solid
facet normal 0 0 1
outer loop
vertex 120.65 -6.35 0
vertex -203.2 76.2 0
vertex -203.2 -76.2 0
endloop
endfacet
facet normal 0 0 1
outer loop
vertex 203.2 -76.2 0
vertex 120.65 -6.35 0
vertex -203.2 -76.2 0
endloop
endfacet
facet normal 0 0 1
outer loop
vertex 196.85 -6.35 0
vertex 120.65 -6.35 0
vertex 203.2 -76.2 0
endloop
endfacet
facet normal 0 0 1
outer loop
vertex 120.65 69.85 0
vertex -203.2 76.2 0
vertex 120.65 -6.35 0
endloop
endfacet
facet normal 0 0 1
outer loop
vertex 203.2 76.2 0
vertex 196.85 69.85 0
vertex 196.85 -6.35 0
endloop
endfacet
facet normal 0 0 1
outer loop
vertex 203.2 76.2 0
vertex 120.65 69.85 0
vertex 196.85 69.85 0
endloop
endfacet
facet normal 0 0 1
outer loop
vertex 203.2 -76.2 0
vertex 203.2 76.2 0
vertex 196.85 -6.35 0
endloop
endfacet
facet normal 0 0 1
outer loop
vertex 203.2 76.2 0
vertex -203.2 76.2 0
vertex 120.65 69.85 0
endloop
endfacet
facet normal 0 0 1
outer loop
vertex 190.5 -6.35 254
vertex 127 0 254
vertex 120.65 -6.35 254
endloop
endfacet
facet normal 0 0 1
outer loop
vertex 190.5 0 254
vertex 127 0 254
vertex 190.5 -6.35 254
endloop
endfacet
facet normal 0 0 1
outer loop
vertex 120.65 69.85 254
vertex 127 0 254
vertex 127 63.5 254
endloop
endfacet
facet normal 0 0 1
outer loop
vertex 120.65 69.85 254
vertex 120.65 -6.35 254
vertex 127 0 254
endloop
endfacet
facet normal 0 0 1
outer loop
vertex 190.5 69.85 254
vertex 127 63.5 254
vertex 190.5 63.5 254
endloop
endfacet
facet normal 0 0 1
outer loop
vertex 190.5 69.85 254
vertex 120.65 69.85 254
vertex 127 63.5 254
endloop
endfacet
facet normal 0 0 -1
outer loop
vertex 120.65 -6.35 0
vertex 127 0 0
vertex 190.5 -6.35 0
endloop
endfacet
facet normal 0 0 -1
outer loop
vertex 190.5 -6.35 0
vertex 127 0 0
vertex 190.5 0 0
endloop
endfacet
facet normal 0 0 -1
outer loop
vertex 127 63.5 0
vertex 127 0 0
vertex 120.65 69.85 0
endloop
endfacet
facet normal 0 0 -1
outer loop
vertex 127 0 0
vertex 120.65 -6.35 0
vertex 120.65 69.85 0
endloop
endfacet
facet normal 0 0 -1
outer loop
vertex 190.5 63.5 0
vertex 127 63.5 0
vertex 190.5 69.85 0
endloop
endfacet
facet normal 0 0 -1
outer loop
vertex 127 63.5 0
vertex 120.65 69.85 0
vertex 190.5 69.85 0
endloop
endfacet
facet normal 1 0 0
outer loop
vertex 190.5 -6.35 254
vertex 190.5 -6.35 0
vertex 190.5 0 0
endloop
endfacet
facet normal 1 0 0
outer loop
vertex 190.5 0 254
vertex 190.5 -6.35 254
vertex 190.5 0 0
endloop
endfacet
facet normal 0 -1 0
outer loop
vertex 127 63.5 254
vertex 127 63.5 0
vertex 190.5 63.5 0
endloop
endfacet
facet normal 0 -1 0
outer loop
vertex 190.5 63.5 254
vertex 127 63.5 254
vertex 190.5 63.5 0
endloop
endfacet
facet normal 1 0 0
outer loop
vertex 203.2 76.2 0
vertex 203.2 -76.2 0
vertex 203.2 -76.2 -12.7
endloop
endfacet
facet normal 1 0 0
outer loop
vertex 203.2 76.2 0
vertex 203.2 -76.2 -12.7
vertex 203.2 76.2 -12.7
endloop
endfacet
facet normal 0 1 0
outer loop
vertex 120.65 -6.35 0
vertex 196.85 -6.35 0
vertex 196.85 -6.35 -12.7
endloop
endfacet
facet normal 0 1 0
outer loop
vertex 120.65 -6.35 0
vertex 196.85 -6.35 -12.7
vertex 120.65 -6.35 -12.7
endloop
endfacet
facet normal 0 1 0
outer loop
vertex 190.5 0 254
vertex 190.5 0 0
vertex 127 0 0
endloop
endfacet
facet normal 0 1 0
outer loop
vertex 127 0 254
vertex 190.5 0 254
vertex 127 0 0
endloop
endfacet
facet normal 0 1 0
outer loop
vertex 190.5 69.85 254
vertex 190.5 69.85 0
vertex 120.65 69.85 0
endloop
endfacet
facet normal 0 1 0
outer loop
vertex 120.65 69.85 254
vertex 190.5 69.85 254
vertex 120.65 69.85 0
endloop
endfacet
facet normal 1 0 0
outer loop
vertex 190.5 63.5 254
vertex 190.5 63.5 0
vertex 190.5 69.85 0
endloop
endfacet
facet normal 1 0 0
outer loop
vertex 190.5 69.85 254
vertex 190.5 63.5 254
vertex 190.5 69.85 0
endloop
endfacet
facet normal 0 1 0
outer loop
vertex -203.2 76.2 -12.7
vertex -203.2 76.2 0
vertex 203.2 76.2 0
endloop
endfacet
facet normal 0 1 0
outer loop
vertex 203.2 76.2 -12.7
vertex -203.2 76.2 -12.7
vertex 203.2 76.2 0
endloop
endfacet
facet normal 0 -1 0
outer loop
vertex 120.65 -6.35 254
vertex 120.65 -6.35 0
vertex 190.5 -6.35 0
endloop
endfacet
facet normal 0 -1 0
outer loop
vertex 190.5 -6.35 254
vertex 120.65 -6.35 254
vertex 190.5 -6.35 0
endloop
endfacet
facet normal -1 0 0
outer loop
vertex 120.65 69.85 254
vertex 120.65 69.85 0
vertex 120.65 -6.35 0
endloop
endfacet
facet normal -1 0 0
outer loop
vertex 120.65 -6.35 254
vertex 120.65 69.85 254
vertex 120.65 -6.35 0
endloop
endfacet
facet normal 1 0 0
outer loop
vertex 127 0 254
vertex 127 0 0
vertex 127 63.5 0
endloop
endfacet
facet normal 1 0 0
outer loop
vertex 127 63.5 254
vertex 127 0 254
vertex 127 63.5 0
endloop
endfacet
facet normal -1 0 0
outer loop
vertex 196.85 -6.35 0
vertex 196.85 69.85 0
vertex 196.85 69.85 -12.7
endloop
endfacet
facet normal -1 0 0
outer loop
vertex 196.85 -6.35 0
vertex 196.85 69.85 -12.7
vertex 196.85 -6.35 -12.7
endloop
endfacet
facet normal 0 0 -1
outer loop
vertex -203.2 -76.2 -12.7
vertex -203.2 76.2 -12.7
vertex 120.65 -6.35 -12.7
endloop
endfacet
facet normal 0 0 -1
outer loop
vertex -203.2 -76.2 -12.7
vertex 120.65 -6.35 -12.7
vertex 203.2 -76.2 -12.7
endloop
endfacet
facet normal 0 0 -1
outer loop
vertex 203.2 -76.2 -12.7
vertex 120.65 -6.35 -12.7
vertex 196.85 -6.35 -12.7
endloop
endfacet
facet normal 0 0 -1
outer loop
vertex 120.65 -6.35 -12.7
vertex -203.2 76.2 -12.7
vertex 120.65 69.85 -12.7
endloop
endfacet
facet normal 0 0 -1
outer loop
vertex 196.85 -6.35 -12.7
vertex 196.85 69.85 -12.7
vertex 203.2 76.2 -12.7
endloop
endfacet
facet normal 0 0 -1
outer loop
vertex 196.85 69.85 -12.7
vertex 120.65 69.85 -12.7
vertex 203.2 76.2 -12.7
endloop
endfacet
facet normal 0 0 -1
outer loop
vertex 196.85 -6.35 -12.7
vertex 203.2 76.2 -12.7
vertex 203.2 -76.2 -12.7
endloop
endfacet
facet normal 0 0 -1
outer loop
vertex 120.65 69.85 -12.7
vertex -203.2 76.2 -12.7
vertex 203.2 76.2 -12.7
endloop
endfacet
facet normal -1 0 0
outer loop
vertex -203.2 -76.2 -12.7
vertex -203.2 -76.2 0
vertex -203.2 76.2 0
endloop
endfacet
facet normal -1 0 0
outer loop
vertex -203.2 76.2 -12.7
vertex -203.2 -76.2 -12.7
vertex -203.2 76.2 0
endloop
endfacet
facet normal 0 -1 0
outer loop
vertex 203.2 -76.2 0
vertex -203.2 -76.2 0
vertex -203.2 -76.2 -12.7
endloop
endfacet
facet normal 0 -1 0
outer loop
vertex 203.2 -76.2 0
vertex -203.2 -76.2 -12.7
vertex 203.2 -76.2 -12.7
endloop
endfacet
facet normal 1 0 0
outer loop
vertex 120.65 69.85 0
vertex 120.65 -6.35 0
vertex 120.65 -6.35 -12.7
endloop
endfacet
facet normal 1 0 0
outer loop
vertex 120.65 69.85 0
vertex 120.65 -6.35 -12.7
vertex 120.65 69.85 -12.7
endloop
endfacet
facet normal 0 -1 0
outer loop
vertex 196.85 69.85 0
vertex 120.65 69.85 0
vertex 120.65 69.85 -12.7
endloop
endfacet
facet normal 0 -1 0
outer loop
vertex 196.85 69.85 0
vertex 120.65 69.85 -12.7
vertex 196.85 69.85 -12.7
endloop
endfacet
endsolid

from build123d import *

# Parameters (mm, degrees)
F0_W     = 406.4
F0_H     = 152.4
F1_DEPTH = 12.7
F2_DEPTH = 254


with BuildPart() as f1:
    # F0 (on Top) → F1 (new body)
    with BuildSketch(Plane.XY):
        Rectangle(F0_W, F0_H)
        Polygon((196.85, -6.35), (190.5, -6.35), (120.65, -6.35), (120.65, 69.85), (190.5, 69.85), (196.85, 69.85), align=None, mode=Mode.SUBTRACT)
    extrude(amount=-F1_DEPTH)


with BuildPart() as f2:
    # F0 (on Top) → F2 (new body)
    with BuildSketch(Plane.XY):
        Polygon((190.5, -6.35), (190.5, 0), (127, 0), (127, 63.5), (190.5, 63.5), (190.5, 69.85), (120.65, 69.85), (120.65, -6.35), align=None)
    extrude(amount=F2_DEPTH)


solid = Compound([f1.part, f2.part])
